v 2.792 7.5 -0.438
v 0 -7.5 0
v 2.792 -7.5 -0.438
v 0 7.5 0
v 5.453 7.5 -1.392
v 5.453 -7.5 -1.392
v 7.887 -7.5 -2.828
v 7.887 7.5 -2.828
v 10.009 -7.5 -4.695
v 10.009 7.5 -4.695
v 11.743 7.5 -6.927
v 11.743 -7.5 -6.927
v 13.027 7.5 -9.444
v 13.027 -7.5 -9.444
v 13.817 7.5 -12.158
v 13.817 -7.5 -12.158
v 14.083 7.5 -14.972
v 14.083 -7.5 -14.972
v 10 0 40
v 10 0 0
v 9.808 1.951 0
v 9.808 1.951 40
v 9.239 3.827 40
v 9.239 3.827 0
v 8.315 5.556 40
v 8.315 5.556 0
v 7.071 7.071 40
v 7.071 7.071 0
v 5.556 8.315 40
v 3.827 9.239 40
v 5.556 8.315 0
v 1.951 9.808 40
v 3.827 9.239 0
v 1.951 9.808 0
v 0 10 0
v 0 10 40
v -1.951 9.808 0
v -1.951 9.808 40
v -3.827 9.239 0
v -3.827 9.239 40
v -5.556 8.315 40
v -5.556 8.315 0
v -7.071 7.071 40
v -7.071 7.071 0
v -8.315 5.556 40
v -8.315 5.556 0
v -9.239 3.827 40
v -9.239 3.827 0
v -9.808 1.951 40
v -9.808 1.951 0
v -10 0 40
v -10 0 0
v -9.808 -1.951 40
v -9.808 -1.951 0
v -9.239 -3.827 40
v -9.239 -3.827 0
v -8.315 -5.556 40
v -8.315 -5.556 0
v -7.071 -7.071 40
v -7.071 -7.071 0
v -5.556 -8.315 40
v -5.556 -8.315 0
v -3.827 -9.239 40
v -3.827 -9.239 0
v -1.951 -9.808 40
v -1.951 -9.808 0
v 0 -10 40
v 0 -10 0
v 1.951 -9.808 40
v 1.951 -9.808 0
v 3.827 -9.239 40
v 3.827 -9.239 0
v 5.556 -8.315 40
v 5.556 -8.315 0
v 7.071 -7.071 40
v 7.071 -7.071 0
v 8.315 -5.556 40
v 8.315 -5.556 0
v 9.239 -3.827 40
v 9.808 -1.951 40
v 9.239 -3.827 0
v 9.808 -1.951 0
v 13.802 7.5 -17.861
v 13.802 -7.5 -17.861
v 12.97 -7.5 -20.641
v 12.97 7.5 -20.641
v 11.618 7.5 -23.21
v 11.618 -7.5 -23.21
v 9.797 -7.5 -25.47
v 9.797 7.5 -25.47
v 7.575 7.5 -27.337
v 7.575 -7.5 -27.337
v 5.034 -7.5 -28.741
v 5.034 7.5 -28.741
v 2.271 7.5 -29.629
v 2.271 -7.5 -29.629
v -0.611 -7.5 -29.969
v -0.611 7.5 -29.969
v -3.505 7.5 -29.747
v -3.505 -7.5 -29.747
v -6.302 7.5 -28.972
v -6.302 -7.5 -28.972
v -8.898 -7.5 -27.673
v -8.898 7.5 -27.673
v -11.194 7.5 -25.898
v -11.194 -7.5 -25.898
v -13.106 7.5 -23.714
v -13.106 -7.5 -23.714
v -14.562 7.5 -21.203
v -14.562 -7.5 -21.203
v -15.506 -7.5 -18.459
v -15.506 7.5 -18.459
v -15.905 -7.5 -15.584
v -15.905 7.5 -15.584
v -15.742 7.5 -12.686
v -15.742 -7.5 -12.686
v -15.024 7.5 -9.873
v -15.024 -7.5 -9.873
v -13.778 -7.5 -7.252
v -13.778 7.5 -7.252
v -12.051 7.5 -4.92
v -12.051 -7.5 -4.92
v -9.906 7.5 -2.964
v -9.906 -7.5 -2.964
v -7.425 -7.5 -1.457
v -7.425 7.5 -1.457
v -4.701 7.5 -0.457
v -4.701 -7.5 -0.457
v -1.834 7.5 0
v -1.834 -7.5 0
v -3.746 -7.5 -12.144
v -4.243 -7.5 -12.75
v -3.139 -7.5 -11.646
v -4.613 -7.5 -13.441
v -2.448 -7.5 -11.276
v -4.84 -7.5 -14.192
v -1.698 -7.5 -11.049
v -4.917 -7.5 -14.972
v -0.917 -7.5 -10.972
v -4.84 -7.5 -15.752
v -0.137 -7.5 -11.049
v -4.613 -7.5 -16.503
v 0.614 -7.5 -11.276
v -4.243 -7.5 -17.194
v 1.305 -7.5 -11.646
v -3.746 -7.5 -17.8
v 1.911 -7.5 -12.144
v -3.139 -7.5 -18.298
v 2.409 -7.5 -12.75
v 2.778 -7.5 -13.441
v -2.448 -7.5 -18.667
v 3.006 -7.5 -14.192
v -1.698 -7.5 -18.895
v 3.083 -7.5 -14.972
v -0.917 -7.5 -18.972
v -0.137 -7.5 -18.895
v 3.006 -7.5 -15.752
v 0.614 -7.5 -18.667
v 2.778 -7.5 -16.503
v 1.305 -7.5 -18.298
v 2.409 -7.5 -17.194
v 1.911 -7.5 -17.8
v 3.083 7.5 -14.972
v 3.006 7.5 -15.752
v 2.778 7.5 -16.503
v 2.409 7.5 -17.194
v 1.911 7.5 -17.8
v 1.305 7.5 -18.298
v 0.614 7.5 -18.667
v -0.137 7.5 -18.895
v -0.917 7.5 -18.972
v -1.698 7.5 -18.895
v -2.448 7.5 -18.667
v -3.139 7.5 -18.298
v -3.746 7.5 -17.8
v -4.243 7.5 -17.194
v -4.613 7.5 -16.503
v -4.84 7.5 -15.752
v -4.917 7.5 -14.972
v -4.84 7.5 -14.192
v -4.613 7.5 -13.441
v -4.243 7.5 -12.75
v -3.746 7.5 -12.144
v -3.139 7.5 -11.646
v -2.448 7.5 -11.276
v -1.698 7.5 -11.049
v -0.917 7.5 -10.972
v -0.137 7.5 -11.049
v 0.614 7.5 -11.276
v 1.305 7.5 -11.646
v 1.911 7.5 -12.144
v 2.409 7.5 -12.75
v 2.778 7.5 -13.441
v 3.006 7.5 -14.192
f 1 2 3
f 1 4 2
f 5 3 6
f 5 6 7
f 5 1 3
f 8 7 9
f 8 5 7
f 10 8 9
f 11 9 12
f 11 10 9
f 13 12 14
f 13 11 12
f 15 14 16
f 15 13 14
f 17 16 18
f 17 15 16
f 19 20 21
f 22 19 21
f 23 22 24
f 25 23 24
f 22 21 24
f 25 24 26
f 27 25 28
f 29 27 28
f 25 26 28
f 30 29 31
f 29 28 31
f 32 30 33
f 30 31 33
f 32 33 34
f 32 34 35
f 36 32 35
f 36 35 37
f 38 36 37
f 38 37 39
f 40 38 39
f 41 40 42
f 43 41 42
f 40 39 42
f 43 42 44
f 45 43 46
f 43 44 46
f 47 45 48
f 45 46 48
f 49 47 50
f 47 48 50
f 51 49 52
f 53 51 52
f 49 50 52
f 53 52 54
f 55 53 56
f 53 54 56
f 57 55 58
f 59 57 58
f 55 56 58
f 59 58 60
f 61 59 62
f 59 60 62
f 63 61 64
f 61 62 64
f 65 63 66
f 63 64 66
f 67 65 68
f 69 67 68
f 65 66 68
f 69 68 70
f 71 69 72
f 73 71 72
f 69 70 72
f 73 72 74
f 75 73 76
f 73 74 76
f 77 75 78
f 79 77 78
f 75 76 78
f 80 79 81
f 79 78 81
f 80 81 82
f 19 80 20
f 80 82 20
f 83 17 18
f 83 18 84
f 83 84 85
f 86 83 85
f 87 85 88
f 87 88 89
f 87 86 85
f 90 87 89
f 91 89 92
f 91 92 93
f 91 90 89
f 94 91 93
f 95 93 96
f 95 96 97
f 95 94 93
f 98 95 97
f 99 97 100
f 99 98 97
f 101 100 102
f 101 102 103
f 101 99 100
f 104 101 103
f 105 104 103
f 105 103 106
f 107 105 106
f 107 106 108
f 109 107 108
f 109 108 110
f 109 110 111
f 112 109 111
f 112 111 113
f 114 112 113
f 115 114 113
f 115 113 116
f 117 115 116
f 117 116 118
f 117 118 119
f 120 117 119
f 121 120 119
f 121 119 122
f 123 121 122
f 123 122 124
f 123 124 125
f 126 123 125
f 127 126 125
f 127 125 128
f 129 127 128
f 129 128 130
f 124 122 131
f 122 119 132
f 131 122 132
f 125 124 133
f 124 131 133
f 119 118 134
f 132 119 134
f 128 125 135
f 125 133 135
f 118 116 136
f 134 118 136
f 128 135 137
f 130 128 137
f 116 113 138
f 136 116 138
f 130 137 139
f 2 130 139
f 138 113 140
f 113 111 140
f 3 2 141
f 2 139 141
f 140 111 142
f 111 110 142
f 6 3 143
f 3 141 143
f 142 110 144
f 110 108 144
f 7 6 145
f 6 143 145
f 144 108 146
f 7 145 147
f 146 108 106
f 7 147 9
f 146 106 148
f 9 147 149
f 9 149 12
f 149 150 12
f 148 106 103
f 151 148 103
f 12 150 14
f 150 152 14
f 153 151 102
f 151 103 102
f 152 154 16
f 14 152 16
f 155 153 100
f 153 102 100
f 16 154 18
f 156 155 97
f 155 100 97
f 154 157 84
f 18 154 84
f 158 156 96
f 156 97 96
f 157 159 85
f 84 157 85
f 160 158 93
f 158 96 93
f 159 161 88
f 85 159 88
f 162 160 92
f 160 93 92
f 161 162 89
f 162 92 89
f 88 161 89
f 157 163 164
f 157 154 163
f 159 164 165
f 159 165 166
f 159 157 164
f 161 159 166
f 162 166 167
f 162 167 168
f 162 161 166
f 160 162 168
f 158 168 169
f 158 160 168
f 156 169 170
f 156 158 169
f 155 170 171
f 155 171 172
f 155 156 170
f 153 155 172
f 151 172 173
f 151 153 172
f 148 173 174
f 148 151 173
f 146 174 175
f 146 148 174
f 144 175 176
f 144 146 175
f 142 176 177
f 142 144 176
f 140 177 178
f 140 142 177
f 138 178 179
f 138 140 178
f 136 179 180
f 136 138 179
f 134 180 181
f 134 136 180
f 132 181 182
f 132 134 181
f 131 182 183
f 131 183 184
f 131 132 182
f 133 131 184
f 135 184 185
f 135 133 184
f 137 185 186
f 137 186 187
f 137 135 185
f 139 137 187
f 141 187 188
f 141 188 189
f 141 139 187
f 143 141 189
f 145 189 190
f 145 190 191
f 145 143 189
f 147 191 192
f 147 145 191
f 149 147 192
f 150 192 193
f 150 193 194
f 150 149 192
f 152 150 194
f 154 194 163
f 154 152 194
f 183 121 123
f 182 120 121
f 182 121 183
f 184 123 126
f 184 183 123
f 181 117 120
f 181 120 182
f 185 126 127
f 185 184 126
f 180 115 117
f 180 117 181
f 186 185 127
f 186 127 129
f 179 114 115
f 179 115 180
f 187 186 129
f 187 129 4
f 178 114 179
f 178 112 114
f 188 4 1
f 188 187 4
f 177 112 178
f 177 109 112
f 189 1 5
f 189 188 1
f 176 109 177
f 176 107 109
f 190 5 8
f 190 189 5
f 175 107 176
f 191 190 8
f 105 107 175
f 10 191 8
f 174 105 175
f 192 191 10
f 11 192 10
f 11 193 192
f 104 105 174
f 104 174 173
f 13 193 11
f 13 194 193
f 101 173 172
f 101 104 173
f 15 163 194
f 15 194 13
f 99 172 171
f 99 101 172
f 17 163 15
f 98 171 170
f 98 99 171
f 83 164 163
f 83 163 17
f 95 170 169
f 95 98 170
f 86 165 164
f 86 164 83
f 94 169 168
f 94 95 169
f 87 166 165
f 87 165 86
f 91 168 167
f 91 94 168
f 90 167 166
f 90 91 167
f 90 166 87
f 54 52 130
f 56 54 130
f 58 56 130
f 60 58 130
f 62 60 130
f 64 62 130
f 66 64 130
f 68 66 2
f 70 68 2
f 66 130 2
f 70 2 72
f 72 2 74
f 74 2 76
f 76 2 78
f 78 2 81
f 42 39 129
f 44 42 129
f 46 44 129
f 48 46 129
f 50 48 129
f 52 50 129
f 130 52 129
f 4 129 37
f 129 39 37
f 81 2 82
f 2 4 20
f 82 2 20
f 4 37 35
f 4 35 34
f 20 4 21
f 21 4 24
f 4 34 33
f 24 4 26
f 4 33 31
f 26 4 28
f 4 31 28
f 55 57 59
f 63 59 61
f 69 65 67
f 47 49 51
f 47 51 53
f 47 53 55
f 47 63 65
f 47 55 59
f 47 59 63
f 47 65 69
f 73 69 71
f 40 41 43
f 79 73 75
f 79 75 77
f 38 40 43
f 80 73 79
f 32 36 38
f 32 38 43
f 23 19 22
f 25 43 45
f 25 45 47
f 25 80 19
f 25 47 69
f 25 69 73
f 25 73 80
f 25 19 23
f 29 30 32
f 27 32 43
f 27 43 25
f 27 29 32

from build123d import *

# Parameters (mm, degrees)
SKETCH2_R           = 10
BOSS_EXTRUDE1_DEPTH = 40
SKETCH4_R           = 15
SKETCH4_R_2         = 4
BOSS_EXTRUDE2_DEPTH = 7.5


with BuildPart() as part:
    # Sketch2 → Boss-Extrude1 (new body)
    with BuildSketch(Plane.XY):
        Circle(SKETCH2_R)
    extrude(amount=BOSS_EXTRUDE1_DEPTH)

    # Sketch4 → Boss-Extrude2 (add, symmetric)
    with BuildSketch(Plane(origin=(0, 0, 0), x_dir=(1, 0, 0), z_dir=(0, 1, 0))):
        with Locations((-0.917156345, 14.971934552)):
            Circle(SKETCH4_R)
        with Locations((-0.917156345, 14.971934552)):
            Circle(SKETCH4_R_2, mode=Mode.SUBTRACT)
    extrude(amount=BOSS_EXTRUDE2_DEPTH, both=True)


solid = part.part
